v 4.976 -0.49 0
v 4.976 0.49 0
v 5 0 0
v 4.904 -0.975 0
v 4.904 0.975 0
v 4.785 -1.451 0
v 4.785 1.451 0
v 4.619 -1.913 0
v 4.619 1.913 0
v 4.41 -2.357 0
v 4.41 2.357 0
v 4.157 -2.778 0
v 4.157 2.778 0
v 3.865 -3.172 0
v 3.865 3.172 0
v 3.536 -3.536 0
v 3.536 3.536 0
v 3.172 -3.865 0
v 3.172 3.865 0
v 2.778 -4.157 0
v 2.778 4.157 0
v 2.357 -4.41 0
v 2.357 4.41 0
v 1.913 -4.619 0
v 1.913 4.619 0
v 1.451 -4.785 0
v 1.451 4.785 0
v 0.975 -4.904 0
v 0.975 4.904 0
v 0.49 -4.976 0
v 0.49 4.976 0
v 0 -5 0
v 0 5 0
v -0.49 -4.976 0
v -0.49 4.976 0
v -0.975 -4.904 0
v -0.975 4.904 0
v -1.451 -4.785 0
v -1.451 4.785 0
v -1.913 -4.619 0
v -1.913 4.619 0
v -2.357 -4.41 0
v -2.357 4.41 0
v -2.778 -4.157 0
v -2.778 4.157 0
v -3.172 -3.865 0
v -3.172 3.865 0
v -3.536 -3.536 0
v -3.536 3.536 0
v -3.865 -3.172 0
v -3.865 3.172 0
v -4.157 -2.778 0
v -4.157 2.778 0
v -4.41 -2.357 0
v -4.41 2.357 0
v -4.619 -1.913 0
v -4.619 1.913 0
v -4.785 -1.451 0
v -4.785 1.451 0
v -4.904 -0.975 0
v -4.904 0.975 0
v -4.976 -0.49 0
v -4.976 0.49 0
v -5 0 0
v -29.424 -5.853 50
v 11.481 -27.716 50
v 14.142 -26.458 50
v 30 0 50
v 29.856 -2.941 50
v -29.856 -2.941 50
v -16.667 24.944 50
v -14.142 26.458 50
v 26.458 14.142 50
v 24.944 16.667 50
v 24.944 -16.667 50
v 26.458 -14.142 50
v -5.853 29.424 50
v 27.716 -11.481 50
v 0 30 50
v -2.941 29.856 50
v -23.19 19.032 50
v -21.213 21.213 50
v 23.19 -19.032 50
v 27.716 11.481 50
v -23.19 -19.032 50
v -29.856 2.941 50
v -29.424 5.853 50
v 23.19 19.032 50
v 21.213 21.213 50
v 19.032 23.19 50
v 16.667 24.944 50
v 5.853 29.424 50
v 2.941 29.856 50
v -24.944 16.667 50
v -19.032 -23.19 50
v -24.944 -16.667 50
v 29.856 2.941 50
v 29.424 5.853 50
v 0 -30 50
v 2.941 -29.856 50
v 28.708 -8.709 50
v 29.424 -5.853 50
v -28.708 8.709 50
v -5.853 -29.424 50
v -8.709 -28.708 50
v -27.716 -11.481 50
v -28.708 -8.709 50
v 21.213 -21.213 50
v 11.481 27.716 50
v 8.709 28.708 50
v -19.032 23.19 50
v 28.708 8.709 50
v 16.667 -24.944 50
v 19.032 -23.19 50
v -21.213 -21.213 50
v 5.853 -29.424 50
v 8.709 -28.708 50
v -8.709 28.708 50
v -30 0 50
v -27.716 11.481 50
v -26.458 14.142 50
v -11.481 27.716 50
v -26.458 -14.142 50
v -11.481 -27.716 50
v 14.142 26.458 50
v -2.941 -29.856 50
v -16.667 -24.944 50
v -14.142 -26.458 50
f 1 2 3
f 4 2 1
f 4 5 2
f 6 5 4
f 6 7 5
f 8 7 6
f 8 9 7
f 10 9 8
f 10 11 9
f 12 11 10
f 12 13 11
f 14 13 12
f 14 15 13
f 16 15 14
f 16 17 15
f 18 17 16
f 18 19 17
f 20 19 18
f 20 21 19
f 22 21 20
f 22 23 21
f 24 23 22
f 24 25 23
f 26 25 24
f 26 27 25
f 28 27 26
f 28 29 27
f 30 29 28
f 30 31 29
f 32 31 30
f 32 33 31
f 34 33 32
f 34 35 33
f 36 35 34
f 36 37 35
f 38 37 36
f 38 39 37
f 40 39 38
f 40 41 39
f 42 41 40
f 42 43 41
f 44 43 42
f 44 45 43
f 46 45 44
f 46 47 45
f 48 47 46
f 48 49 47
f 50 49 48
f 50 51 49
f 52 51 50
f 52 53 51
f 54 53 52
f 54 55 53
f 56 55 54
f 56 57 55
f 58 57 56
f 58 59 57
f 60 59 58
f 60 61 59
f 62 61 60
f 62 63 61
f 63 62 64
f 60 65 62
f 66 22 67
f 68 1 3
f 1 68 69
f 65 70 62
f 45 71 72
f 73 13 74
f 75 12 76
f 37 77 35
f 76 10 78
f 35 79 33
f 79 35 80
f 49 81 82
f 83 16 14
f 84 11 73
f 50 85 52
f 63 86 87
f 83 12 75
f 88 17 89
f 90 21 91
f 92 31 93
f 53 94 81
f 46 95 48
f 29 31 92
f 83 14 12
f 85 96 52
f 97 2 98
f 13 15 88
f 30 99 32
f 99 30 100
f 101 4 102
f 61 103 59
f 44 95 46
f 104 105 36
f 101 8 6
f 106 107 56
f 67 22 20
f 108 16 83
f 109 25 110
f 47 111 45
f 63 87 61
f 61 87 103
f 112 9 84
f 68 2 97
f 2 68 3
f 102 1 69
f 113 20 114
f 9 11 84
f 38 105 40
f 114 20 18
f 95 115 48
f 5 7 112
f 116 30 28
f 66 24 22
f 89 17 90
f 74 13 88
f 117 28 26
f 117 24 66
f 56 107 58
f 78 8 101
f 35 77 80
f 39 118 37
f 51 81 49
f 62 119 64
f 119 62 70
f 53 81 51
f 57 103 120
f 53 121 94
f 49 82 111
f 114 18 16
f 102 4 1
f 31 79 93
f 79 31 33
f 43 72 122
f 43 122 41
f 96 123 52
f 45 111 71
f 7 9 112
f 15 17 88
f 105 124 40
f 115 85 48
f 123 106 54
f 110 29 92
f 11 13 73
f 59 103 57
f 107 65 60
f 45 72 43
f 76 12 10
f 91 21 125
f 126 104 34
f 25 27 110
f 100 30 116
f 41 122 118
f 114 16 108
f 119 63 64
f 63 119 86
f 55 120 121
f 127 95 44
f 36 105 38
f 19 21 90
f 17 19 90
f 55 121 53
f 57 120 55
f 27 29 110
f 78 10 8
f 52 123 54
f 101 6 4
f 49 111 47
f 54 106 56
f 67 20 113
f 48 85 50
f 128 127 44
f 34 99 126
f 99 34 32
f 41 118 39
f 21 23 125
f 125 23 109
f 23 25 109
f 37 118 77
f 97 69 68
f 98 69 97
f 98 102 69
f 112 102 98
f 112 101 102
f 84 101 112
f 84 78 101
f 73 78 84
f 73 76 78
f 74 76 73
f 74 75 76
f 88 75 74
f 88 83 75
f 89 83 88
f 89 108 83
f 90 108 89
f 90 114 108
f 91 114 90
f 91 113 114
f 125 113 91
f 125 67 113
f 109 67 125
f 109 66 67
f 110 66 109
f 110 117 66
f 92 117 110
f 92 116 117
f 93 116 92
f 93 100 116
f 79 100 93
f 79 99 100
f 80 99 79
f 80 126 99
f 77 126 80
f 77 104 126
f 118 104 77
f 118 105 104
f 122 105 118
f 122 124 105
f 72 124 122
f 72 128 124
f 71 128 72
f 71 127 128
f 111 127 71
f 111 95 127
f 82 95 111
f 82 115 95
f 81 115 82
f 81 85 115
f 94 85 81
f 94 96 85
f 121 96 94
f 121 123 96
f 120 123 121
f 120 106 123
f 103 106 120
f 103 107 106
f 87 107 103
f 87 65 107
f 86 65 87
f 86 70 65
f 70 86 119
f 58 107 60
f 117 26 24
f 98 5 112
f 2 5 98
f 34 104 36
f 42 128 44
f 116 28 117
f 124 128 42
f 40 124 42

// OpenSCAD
// Lab Funnel Design
// Units: mm

// Dimensions
funnel_wall_thickness = 1.6;
funnel_spout_od = 10;
funnel_spout_length = 20;
funnel_cone_od_top = 60;
funnel_cone_height = 50;
funnel_cone_od_bottom = funnel_spout_od;

// Derived Dimensions
funnel_spout_id = funnel_spout_od - (2 * funnel_wall_thickness);
funnel_cone_id_top = funnel_cone_od_top - (2 * funnel_wall_thickness);
funnel_cone_id_bottom = funnel_cone_od_bottom - (2 * funnel_wall_thickness);

// Render
$fn = 64;

// Main Body
union() {
    // Spout (Straight Tube)
    cylinder(
        h = funnel_spout_length, 
        r1 = funnel_spout_od / 2, 
        r2 = funnel_spout_od / 2
    );
    
    // Cone (Tapered Section)
    // We calculate the radius at the bottom of the cone to create a smooth transition
    // The cone starts at z=20 (radius 5) and ends at z=50 (radius 30)
    cone_radius_bottom = funnel_spout_od / 2;
    cone_radius_top = funnel_cone_od_top / 2;
    
    cylinder(
        h = funnel_cone_height, 
        r1 = cone_radius_bottom, 
        r2 = cone_radius_top
    );
}

// Inner Cut (Void)
// The cut extends slightly past the top face to ensure the rim is fully open
difference() {
    // Outer shape (already defined in union)
    
    // Spout Bore
    cylinder(
        h = funnel_spout_length + 0.1, 
        r = funnel_spout_id / 2
    );
    
    // Cone Bore
    cylinder(
        h = funnel_cone_height + 0.1, 
        r1 = funnel_cone_id_bottom / 2, 
        r2 = funnel_cone_id_top / 2
    );
}
